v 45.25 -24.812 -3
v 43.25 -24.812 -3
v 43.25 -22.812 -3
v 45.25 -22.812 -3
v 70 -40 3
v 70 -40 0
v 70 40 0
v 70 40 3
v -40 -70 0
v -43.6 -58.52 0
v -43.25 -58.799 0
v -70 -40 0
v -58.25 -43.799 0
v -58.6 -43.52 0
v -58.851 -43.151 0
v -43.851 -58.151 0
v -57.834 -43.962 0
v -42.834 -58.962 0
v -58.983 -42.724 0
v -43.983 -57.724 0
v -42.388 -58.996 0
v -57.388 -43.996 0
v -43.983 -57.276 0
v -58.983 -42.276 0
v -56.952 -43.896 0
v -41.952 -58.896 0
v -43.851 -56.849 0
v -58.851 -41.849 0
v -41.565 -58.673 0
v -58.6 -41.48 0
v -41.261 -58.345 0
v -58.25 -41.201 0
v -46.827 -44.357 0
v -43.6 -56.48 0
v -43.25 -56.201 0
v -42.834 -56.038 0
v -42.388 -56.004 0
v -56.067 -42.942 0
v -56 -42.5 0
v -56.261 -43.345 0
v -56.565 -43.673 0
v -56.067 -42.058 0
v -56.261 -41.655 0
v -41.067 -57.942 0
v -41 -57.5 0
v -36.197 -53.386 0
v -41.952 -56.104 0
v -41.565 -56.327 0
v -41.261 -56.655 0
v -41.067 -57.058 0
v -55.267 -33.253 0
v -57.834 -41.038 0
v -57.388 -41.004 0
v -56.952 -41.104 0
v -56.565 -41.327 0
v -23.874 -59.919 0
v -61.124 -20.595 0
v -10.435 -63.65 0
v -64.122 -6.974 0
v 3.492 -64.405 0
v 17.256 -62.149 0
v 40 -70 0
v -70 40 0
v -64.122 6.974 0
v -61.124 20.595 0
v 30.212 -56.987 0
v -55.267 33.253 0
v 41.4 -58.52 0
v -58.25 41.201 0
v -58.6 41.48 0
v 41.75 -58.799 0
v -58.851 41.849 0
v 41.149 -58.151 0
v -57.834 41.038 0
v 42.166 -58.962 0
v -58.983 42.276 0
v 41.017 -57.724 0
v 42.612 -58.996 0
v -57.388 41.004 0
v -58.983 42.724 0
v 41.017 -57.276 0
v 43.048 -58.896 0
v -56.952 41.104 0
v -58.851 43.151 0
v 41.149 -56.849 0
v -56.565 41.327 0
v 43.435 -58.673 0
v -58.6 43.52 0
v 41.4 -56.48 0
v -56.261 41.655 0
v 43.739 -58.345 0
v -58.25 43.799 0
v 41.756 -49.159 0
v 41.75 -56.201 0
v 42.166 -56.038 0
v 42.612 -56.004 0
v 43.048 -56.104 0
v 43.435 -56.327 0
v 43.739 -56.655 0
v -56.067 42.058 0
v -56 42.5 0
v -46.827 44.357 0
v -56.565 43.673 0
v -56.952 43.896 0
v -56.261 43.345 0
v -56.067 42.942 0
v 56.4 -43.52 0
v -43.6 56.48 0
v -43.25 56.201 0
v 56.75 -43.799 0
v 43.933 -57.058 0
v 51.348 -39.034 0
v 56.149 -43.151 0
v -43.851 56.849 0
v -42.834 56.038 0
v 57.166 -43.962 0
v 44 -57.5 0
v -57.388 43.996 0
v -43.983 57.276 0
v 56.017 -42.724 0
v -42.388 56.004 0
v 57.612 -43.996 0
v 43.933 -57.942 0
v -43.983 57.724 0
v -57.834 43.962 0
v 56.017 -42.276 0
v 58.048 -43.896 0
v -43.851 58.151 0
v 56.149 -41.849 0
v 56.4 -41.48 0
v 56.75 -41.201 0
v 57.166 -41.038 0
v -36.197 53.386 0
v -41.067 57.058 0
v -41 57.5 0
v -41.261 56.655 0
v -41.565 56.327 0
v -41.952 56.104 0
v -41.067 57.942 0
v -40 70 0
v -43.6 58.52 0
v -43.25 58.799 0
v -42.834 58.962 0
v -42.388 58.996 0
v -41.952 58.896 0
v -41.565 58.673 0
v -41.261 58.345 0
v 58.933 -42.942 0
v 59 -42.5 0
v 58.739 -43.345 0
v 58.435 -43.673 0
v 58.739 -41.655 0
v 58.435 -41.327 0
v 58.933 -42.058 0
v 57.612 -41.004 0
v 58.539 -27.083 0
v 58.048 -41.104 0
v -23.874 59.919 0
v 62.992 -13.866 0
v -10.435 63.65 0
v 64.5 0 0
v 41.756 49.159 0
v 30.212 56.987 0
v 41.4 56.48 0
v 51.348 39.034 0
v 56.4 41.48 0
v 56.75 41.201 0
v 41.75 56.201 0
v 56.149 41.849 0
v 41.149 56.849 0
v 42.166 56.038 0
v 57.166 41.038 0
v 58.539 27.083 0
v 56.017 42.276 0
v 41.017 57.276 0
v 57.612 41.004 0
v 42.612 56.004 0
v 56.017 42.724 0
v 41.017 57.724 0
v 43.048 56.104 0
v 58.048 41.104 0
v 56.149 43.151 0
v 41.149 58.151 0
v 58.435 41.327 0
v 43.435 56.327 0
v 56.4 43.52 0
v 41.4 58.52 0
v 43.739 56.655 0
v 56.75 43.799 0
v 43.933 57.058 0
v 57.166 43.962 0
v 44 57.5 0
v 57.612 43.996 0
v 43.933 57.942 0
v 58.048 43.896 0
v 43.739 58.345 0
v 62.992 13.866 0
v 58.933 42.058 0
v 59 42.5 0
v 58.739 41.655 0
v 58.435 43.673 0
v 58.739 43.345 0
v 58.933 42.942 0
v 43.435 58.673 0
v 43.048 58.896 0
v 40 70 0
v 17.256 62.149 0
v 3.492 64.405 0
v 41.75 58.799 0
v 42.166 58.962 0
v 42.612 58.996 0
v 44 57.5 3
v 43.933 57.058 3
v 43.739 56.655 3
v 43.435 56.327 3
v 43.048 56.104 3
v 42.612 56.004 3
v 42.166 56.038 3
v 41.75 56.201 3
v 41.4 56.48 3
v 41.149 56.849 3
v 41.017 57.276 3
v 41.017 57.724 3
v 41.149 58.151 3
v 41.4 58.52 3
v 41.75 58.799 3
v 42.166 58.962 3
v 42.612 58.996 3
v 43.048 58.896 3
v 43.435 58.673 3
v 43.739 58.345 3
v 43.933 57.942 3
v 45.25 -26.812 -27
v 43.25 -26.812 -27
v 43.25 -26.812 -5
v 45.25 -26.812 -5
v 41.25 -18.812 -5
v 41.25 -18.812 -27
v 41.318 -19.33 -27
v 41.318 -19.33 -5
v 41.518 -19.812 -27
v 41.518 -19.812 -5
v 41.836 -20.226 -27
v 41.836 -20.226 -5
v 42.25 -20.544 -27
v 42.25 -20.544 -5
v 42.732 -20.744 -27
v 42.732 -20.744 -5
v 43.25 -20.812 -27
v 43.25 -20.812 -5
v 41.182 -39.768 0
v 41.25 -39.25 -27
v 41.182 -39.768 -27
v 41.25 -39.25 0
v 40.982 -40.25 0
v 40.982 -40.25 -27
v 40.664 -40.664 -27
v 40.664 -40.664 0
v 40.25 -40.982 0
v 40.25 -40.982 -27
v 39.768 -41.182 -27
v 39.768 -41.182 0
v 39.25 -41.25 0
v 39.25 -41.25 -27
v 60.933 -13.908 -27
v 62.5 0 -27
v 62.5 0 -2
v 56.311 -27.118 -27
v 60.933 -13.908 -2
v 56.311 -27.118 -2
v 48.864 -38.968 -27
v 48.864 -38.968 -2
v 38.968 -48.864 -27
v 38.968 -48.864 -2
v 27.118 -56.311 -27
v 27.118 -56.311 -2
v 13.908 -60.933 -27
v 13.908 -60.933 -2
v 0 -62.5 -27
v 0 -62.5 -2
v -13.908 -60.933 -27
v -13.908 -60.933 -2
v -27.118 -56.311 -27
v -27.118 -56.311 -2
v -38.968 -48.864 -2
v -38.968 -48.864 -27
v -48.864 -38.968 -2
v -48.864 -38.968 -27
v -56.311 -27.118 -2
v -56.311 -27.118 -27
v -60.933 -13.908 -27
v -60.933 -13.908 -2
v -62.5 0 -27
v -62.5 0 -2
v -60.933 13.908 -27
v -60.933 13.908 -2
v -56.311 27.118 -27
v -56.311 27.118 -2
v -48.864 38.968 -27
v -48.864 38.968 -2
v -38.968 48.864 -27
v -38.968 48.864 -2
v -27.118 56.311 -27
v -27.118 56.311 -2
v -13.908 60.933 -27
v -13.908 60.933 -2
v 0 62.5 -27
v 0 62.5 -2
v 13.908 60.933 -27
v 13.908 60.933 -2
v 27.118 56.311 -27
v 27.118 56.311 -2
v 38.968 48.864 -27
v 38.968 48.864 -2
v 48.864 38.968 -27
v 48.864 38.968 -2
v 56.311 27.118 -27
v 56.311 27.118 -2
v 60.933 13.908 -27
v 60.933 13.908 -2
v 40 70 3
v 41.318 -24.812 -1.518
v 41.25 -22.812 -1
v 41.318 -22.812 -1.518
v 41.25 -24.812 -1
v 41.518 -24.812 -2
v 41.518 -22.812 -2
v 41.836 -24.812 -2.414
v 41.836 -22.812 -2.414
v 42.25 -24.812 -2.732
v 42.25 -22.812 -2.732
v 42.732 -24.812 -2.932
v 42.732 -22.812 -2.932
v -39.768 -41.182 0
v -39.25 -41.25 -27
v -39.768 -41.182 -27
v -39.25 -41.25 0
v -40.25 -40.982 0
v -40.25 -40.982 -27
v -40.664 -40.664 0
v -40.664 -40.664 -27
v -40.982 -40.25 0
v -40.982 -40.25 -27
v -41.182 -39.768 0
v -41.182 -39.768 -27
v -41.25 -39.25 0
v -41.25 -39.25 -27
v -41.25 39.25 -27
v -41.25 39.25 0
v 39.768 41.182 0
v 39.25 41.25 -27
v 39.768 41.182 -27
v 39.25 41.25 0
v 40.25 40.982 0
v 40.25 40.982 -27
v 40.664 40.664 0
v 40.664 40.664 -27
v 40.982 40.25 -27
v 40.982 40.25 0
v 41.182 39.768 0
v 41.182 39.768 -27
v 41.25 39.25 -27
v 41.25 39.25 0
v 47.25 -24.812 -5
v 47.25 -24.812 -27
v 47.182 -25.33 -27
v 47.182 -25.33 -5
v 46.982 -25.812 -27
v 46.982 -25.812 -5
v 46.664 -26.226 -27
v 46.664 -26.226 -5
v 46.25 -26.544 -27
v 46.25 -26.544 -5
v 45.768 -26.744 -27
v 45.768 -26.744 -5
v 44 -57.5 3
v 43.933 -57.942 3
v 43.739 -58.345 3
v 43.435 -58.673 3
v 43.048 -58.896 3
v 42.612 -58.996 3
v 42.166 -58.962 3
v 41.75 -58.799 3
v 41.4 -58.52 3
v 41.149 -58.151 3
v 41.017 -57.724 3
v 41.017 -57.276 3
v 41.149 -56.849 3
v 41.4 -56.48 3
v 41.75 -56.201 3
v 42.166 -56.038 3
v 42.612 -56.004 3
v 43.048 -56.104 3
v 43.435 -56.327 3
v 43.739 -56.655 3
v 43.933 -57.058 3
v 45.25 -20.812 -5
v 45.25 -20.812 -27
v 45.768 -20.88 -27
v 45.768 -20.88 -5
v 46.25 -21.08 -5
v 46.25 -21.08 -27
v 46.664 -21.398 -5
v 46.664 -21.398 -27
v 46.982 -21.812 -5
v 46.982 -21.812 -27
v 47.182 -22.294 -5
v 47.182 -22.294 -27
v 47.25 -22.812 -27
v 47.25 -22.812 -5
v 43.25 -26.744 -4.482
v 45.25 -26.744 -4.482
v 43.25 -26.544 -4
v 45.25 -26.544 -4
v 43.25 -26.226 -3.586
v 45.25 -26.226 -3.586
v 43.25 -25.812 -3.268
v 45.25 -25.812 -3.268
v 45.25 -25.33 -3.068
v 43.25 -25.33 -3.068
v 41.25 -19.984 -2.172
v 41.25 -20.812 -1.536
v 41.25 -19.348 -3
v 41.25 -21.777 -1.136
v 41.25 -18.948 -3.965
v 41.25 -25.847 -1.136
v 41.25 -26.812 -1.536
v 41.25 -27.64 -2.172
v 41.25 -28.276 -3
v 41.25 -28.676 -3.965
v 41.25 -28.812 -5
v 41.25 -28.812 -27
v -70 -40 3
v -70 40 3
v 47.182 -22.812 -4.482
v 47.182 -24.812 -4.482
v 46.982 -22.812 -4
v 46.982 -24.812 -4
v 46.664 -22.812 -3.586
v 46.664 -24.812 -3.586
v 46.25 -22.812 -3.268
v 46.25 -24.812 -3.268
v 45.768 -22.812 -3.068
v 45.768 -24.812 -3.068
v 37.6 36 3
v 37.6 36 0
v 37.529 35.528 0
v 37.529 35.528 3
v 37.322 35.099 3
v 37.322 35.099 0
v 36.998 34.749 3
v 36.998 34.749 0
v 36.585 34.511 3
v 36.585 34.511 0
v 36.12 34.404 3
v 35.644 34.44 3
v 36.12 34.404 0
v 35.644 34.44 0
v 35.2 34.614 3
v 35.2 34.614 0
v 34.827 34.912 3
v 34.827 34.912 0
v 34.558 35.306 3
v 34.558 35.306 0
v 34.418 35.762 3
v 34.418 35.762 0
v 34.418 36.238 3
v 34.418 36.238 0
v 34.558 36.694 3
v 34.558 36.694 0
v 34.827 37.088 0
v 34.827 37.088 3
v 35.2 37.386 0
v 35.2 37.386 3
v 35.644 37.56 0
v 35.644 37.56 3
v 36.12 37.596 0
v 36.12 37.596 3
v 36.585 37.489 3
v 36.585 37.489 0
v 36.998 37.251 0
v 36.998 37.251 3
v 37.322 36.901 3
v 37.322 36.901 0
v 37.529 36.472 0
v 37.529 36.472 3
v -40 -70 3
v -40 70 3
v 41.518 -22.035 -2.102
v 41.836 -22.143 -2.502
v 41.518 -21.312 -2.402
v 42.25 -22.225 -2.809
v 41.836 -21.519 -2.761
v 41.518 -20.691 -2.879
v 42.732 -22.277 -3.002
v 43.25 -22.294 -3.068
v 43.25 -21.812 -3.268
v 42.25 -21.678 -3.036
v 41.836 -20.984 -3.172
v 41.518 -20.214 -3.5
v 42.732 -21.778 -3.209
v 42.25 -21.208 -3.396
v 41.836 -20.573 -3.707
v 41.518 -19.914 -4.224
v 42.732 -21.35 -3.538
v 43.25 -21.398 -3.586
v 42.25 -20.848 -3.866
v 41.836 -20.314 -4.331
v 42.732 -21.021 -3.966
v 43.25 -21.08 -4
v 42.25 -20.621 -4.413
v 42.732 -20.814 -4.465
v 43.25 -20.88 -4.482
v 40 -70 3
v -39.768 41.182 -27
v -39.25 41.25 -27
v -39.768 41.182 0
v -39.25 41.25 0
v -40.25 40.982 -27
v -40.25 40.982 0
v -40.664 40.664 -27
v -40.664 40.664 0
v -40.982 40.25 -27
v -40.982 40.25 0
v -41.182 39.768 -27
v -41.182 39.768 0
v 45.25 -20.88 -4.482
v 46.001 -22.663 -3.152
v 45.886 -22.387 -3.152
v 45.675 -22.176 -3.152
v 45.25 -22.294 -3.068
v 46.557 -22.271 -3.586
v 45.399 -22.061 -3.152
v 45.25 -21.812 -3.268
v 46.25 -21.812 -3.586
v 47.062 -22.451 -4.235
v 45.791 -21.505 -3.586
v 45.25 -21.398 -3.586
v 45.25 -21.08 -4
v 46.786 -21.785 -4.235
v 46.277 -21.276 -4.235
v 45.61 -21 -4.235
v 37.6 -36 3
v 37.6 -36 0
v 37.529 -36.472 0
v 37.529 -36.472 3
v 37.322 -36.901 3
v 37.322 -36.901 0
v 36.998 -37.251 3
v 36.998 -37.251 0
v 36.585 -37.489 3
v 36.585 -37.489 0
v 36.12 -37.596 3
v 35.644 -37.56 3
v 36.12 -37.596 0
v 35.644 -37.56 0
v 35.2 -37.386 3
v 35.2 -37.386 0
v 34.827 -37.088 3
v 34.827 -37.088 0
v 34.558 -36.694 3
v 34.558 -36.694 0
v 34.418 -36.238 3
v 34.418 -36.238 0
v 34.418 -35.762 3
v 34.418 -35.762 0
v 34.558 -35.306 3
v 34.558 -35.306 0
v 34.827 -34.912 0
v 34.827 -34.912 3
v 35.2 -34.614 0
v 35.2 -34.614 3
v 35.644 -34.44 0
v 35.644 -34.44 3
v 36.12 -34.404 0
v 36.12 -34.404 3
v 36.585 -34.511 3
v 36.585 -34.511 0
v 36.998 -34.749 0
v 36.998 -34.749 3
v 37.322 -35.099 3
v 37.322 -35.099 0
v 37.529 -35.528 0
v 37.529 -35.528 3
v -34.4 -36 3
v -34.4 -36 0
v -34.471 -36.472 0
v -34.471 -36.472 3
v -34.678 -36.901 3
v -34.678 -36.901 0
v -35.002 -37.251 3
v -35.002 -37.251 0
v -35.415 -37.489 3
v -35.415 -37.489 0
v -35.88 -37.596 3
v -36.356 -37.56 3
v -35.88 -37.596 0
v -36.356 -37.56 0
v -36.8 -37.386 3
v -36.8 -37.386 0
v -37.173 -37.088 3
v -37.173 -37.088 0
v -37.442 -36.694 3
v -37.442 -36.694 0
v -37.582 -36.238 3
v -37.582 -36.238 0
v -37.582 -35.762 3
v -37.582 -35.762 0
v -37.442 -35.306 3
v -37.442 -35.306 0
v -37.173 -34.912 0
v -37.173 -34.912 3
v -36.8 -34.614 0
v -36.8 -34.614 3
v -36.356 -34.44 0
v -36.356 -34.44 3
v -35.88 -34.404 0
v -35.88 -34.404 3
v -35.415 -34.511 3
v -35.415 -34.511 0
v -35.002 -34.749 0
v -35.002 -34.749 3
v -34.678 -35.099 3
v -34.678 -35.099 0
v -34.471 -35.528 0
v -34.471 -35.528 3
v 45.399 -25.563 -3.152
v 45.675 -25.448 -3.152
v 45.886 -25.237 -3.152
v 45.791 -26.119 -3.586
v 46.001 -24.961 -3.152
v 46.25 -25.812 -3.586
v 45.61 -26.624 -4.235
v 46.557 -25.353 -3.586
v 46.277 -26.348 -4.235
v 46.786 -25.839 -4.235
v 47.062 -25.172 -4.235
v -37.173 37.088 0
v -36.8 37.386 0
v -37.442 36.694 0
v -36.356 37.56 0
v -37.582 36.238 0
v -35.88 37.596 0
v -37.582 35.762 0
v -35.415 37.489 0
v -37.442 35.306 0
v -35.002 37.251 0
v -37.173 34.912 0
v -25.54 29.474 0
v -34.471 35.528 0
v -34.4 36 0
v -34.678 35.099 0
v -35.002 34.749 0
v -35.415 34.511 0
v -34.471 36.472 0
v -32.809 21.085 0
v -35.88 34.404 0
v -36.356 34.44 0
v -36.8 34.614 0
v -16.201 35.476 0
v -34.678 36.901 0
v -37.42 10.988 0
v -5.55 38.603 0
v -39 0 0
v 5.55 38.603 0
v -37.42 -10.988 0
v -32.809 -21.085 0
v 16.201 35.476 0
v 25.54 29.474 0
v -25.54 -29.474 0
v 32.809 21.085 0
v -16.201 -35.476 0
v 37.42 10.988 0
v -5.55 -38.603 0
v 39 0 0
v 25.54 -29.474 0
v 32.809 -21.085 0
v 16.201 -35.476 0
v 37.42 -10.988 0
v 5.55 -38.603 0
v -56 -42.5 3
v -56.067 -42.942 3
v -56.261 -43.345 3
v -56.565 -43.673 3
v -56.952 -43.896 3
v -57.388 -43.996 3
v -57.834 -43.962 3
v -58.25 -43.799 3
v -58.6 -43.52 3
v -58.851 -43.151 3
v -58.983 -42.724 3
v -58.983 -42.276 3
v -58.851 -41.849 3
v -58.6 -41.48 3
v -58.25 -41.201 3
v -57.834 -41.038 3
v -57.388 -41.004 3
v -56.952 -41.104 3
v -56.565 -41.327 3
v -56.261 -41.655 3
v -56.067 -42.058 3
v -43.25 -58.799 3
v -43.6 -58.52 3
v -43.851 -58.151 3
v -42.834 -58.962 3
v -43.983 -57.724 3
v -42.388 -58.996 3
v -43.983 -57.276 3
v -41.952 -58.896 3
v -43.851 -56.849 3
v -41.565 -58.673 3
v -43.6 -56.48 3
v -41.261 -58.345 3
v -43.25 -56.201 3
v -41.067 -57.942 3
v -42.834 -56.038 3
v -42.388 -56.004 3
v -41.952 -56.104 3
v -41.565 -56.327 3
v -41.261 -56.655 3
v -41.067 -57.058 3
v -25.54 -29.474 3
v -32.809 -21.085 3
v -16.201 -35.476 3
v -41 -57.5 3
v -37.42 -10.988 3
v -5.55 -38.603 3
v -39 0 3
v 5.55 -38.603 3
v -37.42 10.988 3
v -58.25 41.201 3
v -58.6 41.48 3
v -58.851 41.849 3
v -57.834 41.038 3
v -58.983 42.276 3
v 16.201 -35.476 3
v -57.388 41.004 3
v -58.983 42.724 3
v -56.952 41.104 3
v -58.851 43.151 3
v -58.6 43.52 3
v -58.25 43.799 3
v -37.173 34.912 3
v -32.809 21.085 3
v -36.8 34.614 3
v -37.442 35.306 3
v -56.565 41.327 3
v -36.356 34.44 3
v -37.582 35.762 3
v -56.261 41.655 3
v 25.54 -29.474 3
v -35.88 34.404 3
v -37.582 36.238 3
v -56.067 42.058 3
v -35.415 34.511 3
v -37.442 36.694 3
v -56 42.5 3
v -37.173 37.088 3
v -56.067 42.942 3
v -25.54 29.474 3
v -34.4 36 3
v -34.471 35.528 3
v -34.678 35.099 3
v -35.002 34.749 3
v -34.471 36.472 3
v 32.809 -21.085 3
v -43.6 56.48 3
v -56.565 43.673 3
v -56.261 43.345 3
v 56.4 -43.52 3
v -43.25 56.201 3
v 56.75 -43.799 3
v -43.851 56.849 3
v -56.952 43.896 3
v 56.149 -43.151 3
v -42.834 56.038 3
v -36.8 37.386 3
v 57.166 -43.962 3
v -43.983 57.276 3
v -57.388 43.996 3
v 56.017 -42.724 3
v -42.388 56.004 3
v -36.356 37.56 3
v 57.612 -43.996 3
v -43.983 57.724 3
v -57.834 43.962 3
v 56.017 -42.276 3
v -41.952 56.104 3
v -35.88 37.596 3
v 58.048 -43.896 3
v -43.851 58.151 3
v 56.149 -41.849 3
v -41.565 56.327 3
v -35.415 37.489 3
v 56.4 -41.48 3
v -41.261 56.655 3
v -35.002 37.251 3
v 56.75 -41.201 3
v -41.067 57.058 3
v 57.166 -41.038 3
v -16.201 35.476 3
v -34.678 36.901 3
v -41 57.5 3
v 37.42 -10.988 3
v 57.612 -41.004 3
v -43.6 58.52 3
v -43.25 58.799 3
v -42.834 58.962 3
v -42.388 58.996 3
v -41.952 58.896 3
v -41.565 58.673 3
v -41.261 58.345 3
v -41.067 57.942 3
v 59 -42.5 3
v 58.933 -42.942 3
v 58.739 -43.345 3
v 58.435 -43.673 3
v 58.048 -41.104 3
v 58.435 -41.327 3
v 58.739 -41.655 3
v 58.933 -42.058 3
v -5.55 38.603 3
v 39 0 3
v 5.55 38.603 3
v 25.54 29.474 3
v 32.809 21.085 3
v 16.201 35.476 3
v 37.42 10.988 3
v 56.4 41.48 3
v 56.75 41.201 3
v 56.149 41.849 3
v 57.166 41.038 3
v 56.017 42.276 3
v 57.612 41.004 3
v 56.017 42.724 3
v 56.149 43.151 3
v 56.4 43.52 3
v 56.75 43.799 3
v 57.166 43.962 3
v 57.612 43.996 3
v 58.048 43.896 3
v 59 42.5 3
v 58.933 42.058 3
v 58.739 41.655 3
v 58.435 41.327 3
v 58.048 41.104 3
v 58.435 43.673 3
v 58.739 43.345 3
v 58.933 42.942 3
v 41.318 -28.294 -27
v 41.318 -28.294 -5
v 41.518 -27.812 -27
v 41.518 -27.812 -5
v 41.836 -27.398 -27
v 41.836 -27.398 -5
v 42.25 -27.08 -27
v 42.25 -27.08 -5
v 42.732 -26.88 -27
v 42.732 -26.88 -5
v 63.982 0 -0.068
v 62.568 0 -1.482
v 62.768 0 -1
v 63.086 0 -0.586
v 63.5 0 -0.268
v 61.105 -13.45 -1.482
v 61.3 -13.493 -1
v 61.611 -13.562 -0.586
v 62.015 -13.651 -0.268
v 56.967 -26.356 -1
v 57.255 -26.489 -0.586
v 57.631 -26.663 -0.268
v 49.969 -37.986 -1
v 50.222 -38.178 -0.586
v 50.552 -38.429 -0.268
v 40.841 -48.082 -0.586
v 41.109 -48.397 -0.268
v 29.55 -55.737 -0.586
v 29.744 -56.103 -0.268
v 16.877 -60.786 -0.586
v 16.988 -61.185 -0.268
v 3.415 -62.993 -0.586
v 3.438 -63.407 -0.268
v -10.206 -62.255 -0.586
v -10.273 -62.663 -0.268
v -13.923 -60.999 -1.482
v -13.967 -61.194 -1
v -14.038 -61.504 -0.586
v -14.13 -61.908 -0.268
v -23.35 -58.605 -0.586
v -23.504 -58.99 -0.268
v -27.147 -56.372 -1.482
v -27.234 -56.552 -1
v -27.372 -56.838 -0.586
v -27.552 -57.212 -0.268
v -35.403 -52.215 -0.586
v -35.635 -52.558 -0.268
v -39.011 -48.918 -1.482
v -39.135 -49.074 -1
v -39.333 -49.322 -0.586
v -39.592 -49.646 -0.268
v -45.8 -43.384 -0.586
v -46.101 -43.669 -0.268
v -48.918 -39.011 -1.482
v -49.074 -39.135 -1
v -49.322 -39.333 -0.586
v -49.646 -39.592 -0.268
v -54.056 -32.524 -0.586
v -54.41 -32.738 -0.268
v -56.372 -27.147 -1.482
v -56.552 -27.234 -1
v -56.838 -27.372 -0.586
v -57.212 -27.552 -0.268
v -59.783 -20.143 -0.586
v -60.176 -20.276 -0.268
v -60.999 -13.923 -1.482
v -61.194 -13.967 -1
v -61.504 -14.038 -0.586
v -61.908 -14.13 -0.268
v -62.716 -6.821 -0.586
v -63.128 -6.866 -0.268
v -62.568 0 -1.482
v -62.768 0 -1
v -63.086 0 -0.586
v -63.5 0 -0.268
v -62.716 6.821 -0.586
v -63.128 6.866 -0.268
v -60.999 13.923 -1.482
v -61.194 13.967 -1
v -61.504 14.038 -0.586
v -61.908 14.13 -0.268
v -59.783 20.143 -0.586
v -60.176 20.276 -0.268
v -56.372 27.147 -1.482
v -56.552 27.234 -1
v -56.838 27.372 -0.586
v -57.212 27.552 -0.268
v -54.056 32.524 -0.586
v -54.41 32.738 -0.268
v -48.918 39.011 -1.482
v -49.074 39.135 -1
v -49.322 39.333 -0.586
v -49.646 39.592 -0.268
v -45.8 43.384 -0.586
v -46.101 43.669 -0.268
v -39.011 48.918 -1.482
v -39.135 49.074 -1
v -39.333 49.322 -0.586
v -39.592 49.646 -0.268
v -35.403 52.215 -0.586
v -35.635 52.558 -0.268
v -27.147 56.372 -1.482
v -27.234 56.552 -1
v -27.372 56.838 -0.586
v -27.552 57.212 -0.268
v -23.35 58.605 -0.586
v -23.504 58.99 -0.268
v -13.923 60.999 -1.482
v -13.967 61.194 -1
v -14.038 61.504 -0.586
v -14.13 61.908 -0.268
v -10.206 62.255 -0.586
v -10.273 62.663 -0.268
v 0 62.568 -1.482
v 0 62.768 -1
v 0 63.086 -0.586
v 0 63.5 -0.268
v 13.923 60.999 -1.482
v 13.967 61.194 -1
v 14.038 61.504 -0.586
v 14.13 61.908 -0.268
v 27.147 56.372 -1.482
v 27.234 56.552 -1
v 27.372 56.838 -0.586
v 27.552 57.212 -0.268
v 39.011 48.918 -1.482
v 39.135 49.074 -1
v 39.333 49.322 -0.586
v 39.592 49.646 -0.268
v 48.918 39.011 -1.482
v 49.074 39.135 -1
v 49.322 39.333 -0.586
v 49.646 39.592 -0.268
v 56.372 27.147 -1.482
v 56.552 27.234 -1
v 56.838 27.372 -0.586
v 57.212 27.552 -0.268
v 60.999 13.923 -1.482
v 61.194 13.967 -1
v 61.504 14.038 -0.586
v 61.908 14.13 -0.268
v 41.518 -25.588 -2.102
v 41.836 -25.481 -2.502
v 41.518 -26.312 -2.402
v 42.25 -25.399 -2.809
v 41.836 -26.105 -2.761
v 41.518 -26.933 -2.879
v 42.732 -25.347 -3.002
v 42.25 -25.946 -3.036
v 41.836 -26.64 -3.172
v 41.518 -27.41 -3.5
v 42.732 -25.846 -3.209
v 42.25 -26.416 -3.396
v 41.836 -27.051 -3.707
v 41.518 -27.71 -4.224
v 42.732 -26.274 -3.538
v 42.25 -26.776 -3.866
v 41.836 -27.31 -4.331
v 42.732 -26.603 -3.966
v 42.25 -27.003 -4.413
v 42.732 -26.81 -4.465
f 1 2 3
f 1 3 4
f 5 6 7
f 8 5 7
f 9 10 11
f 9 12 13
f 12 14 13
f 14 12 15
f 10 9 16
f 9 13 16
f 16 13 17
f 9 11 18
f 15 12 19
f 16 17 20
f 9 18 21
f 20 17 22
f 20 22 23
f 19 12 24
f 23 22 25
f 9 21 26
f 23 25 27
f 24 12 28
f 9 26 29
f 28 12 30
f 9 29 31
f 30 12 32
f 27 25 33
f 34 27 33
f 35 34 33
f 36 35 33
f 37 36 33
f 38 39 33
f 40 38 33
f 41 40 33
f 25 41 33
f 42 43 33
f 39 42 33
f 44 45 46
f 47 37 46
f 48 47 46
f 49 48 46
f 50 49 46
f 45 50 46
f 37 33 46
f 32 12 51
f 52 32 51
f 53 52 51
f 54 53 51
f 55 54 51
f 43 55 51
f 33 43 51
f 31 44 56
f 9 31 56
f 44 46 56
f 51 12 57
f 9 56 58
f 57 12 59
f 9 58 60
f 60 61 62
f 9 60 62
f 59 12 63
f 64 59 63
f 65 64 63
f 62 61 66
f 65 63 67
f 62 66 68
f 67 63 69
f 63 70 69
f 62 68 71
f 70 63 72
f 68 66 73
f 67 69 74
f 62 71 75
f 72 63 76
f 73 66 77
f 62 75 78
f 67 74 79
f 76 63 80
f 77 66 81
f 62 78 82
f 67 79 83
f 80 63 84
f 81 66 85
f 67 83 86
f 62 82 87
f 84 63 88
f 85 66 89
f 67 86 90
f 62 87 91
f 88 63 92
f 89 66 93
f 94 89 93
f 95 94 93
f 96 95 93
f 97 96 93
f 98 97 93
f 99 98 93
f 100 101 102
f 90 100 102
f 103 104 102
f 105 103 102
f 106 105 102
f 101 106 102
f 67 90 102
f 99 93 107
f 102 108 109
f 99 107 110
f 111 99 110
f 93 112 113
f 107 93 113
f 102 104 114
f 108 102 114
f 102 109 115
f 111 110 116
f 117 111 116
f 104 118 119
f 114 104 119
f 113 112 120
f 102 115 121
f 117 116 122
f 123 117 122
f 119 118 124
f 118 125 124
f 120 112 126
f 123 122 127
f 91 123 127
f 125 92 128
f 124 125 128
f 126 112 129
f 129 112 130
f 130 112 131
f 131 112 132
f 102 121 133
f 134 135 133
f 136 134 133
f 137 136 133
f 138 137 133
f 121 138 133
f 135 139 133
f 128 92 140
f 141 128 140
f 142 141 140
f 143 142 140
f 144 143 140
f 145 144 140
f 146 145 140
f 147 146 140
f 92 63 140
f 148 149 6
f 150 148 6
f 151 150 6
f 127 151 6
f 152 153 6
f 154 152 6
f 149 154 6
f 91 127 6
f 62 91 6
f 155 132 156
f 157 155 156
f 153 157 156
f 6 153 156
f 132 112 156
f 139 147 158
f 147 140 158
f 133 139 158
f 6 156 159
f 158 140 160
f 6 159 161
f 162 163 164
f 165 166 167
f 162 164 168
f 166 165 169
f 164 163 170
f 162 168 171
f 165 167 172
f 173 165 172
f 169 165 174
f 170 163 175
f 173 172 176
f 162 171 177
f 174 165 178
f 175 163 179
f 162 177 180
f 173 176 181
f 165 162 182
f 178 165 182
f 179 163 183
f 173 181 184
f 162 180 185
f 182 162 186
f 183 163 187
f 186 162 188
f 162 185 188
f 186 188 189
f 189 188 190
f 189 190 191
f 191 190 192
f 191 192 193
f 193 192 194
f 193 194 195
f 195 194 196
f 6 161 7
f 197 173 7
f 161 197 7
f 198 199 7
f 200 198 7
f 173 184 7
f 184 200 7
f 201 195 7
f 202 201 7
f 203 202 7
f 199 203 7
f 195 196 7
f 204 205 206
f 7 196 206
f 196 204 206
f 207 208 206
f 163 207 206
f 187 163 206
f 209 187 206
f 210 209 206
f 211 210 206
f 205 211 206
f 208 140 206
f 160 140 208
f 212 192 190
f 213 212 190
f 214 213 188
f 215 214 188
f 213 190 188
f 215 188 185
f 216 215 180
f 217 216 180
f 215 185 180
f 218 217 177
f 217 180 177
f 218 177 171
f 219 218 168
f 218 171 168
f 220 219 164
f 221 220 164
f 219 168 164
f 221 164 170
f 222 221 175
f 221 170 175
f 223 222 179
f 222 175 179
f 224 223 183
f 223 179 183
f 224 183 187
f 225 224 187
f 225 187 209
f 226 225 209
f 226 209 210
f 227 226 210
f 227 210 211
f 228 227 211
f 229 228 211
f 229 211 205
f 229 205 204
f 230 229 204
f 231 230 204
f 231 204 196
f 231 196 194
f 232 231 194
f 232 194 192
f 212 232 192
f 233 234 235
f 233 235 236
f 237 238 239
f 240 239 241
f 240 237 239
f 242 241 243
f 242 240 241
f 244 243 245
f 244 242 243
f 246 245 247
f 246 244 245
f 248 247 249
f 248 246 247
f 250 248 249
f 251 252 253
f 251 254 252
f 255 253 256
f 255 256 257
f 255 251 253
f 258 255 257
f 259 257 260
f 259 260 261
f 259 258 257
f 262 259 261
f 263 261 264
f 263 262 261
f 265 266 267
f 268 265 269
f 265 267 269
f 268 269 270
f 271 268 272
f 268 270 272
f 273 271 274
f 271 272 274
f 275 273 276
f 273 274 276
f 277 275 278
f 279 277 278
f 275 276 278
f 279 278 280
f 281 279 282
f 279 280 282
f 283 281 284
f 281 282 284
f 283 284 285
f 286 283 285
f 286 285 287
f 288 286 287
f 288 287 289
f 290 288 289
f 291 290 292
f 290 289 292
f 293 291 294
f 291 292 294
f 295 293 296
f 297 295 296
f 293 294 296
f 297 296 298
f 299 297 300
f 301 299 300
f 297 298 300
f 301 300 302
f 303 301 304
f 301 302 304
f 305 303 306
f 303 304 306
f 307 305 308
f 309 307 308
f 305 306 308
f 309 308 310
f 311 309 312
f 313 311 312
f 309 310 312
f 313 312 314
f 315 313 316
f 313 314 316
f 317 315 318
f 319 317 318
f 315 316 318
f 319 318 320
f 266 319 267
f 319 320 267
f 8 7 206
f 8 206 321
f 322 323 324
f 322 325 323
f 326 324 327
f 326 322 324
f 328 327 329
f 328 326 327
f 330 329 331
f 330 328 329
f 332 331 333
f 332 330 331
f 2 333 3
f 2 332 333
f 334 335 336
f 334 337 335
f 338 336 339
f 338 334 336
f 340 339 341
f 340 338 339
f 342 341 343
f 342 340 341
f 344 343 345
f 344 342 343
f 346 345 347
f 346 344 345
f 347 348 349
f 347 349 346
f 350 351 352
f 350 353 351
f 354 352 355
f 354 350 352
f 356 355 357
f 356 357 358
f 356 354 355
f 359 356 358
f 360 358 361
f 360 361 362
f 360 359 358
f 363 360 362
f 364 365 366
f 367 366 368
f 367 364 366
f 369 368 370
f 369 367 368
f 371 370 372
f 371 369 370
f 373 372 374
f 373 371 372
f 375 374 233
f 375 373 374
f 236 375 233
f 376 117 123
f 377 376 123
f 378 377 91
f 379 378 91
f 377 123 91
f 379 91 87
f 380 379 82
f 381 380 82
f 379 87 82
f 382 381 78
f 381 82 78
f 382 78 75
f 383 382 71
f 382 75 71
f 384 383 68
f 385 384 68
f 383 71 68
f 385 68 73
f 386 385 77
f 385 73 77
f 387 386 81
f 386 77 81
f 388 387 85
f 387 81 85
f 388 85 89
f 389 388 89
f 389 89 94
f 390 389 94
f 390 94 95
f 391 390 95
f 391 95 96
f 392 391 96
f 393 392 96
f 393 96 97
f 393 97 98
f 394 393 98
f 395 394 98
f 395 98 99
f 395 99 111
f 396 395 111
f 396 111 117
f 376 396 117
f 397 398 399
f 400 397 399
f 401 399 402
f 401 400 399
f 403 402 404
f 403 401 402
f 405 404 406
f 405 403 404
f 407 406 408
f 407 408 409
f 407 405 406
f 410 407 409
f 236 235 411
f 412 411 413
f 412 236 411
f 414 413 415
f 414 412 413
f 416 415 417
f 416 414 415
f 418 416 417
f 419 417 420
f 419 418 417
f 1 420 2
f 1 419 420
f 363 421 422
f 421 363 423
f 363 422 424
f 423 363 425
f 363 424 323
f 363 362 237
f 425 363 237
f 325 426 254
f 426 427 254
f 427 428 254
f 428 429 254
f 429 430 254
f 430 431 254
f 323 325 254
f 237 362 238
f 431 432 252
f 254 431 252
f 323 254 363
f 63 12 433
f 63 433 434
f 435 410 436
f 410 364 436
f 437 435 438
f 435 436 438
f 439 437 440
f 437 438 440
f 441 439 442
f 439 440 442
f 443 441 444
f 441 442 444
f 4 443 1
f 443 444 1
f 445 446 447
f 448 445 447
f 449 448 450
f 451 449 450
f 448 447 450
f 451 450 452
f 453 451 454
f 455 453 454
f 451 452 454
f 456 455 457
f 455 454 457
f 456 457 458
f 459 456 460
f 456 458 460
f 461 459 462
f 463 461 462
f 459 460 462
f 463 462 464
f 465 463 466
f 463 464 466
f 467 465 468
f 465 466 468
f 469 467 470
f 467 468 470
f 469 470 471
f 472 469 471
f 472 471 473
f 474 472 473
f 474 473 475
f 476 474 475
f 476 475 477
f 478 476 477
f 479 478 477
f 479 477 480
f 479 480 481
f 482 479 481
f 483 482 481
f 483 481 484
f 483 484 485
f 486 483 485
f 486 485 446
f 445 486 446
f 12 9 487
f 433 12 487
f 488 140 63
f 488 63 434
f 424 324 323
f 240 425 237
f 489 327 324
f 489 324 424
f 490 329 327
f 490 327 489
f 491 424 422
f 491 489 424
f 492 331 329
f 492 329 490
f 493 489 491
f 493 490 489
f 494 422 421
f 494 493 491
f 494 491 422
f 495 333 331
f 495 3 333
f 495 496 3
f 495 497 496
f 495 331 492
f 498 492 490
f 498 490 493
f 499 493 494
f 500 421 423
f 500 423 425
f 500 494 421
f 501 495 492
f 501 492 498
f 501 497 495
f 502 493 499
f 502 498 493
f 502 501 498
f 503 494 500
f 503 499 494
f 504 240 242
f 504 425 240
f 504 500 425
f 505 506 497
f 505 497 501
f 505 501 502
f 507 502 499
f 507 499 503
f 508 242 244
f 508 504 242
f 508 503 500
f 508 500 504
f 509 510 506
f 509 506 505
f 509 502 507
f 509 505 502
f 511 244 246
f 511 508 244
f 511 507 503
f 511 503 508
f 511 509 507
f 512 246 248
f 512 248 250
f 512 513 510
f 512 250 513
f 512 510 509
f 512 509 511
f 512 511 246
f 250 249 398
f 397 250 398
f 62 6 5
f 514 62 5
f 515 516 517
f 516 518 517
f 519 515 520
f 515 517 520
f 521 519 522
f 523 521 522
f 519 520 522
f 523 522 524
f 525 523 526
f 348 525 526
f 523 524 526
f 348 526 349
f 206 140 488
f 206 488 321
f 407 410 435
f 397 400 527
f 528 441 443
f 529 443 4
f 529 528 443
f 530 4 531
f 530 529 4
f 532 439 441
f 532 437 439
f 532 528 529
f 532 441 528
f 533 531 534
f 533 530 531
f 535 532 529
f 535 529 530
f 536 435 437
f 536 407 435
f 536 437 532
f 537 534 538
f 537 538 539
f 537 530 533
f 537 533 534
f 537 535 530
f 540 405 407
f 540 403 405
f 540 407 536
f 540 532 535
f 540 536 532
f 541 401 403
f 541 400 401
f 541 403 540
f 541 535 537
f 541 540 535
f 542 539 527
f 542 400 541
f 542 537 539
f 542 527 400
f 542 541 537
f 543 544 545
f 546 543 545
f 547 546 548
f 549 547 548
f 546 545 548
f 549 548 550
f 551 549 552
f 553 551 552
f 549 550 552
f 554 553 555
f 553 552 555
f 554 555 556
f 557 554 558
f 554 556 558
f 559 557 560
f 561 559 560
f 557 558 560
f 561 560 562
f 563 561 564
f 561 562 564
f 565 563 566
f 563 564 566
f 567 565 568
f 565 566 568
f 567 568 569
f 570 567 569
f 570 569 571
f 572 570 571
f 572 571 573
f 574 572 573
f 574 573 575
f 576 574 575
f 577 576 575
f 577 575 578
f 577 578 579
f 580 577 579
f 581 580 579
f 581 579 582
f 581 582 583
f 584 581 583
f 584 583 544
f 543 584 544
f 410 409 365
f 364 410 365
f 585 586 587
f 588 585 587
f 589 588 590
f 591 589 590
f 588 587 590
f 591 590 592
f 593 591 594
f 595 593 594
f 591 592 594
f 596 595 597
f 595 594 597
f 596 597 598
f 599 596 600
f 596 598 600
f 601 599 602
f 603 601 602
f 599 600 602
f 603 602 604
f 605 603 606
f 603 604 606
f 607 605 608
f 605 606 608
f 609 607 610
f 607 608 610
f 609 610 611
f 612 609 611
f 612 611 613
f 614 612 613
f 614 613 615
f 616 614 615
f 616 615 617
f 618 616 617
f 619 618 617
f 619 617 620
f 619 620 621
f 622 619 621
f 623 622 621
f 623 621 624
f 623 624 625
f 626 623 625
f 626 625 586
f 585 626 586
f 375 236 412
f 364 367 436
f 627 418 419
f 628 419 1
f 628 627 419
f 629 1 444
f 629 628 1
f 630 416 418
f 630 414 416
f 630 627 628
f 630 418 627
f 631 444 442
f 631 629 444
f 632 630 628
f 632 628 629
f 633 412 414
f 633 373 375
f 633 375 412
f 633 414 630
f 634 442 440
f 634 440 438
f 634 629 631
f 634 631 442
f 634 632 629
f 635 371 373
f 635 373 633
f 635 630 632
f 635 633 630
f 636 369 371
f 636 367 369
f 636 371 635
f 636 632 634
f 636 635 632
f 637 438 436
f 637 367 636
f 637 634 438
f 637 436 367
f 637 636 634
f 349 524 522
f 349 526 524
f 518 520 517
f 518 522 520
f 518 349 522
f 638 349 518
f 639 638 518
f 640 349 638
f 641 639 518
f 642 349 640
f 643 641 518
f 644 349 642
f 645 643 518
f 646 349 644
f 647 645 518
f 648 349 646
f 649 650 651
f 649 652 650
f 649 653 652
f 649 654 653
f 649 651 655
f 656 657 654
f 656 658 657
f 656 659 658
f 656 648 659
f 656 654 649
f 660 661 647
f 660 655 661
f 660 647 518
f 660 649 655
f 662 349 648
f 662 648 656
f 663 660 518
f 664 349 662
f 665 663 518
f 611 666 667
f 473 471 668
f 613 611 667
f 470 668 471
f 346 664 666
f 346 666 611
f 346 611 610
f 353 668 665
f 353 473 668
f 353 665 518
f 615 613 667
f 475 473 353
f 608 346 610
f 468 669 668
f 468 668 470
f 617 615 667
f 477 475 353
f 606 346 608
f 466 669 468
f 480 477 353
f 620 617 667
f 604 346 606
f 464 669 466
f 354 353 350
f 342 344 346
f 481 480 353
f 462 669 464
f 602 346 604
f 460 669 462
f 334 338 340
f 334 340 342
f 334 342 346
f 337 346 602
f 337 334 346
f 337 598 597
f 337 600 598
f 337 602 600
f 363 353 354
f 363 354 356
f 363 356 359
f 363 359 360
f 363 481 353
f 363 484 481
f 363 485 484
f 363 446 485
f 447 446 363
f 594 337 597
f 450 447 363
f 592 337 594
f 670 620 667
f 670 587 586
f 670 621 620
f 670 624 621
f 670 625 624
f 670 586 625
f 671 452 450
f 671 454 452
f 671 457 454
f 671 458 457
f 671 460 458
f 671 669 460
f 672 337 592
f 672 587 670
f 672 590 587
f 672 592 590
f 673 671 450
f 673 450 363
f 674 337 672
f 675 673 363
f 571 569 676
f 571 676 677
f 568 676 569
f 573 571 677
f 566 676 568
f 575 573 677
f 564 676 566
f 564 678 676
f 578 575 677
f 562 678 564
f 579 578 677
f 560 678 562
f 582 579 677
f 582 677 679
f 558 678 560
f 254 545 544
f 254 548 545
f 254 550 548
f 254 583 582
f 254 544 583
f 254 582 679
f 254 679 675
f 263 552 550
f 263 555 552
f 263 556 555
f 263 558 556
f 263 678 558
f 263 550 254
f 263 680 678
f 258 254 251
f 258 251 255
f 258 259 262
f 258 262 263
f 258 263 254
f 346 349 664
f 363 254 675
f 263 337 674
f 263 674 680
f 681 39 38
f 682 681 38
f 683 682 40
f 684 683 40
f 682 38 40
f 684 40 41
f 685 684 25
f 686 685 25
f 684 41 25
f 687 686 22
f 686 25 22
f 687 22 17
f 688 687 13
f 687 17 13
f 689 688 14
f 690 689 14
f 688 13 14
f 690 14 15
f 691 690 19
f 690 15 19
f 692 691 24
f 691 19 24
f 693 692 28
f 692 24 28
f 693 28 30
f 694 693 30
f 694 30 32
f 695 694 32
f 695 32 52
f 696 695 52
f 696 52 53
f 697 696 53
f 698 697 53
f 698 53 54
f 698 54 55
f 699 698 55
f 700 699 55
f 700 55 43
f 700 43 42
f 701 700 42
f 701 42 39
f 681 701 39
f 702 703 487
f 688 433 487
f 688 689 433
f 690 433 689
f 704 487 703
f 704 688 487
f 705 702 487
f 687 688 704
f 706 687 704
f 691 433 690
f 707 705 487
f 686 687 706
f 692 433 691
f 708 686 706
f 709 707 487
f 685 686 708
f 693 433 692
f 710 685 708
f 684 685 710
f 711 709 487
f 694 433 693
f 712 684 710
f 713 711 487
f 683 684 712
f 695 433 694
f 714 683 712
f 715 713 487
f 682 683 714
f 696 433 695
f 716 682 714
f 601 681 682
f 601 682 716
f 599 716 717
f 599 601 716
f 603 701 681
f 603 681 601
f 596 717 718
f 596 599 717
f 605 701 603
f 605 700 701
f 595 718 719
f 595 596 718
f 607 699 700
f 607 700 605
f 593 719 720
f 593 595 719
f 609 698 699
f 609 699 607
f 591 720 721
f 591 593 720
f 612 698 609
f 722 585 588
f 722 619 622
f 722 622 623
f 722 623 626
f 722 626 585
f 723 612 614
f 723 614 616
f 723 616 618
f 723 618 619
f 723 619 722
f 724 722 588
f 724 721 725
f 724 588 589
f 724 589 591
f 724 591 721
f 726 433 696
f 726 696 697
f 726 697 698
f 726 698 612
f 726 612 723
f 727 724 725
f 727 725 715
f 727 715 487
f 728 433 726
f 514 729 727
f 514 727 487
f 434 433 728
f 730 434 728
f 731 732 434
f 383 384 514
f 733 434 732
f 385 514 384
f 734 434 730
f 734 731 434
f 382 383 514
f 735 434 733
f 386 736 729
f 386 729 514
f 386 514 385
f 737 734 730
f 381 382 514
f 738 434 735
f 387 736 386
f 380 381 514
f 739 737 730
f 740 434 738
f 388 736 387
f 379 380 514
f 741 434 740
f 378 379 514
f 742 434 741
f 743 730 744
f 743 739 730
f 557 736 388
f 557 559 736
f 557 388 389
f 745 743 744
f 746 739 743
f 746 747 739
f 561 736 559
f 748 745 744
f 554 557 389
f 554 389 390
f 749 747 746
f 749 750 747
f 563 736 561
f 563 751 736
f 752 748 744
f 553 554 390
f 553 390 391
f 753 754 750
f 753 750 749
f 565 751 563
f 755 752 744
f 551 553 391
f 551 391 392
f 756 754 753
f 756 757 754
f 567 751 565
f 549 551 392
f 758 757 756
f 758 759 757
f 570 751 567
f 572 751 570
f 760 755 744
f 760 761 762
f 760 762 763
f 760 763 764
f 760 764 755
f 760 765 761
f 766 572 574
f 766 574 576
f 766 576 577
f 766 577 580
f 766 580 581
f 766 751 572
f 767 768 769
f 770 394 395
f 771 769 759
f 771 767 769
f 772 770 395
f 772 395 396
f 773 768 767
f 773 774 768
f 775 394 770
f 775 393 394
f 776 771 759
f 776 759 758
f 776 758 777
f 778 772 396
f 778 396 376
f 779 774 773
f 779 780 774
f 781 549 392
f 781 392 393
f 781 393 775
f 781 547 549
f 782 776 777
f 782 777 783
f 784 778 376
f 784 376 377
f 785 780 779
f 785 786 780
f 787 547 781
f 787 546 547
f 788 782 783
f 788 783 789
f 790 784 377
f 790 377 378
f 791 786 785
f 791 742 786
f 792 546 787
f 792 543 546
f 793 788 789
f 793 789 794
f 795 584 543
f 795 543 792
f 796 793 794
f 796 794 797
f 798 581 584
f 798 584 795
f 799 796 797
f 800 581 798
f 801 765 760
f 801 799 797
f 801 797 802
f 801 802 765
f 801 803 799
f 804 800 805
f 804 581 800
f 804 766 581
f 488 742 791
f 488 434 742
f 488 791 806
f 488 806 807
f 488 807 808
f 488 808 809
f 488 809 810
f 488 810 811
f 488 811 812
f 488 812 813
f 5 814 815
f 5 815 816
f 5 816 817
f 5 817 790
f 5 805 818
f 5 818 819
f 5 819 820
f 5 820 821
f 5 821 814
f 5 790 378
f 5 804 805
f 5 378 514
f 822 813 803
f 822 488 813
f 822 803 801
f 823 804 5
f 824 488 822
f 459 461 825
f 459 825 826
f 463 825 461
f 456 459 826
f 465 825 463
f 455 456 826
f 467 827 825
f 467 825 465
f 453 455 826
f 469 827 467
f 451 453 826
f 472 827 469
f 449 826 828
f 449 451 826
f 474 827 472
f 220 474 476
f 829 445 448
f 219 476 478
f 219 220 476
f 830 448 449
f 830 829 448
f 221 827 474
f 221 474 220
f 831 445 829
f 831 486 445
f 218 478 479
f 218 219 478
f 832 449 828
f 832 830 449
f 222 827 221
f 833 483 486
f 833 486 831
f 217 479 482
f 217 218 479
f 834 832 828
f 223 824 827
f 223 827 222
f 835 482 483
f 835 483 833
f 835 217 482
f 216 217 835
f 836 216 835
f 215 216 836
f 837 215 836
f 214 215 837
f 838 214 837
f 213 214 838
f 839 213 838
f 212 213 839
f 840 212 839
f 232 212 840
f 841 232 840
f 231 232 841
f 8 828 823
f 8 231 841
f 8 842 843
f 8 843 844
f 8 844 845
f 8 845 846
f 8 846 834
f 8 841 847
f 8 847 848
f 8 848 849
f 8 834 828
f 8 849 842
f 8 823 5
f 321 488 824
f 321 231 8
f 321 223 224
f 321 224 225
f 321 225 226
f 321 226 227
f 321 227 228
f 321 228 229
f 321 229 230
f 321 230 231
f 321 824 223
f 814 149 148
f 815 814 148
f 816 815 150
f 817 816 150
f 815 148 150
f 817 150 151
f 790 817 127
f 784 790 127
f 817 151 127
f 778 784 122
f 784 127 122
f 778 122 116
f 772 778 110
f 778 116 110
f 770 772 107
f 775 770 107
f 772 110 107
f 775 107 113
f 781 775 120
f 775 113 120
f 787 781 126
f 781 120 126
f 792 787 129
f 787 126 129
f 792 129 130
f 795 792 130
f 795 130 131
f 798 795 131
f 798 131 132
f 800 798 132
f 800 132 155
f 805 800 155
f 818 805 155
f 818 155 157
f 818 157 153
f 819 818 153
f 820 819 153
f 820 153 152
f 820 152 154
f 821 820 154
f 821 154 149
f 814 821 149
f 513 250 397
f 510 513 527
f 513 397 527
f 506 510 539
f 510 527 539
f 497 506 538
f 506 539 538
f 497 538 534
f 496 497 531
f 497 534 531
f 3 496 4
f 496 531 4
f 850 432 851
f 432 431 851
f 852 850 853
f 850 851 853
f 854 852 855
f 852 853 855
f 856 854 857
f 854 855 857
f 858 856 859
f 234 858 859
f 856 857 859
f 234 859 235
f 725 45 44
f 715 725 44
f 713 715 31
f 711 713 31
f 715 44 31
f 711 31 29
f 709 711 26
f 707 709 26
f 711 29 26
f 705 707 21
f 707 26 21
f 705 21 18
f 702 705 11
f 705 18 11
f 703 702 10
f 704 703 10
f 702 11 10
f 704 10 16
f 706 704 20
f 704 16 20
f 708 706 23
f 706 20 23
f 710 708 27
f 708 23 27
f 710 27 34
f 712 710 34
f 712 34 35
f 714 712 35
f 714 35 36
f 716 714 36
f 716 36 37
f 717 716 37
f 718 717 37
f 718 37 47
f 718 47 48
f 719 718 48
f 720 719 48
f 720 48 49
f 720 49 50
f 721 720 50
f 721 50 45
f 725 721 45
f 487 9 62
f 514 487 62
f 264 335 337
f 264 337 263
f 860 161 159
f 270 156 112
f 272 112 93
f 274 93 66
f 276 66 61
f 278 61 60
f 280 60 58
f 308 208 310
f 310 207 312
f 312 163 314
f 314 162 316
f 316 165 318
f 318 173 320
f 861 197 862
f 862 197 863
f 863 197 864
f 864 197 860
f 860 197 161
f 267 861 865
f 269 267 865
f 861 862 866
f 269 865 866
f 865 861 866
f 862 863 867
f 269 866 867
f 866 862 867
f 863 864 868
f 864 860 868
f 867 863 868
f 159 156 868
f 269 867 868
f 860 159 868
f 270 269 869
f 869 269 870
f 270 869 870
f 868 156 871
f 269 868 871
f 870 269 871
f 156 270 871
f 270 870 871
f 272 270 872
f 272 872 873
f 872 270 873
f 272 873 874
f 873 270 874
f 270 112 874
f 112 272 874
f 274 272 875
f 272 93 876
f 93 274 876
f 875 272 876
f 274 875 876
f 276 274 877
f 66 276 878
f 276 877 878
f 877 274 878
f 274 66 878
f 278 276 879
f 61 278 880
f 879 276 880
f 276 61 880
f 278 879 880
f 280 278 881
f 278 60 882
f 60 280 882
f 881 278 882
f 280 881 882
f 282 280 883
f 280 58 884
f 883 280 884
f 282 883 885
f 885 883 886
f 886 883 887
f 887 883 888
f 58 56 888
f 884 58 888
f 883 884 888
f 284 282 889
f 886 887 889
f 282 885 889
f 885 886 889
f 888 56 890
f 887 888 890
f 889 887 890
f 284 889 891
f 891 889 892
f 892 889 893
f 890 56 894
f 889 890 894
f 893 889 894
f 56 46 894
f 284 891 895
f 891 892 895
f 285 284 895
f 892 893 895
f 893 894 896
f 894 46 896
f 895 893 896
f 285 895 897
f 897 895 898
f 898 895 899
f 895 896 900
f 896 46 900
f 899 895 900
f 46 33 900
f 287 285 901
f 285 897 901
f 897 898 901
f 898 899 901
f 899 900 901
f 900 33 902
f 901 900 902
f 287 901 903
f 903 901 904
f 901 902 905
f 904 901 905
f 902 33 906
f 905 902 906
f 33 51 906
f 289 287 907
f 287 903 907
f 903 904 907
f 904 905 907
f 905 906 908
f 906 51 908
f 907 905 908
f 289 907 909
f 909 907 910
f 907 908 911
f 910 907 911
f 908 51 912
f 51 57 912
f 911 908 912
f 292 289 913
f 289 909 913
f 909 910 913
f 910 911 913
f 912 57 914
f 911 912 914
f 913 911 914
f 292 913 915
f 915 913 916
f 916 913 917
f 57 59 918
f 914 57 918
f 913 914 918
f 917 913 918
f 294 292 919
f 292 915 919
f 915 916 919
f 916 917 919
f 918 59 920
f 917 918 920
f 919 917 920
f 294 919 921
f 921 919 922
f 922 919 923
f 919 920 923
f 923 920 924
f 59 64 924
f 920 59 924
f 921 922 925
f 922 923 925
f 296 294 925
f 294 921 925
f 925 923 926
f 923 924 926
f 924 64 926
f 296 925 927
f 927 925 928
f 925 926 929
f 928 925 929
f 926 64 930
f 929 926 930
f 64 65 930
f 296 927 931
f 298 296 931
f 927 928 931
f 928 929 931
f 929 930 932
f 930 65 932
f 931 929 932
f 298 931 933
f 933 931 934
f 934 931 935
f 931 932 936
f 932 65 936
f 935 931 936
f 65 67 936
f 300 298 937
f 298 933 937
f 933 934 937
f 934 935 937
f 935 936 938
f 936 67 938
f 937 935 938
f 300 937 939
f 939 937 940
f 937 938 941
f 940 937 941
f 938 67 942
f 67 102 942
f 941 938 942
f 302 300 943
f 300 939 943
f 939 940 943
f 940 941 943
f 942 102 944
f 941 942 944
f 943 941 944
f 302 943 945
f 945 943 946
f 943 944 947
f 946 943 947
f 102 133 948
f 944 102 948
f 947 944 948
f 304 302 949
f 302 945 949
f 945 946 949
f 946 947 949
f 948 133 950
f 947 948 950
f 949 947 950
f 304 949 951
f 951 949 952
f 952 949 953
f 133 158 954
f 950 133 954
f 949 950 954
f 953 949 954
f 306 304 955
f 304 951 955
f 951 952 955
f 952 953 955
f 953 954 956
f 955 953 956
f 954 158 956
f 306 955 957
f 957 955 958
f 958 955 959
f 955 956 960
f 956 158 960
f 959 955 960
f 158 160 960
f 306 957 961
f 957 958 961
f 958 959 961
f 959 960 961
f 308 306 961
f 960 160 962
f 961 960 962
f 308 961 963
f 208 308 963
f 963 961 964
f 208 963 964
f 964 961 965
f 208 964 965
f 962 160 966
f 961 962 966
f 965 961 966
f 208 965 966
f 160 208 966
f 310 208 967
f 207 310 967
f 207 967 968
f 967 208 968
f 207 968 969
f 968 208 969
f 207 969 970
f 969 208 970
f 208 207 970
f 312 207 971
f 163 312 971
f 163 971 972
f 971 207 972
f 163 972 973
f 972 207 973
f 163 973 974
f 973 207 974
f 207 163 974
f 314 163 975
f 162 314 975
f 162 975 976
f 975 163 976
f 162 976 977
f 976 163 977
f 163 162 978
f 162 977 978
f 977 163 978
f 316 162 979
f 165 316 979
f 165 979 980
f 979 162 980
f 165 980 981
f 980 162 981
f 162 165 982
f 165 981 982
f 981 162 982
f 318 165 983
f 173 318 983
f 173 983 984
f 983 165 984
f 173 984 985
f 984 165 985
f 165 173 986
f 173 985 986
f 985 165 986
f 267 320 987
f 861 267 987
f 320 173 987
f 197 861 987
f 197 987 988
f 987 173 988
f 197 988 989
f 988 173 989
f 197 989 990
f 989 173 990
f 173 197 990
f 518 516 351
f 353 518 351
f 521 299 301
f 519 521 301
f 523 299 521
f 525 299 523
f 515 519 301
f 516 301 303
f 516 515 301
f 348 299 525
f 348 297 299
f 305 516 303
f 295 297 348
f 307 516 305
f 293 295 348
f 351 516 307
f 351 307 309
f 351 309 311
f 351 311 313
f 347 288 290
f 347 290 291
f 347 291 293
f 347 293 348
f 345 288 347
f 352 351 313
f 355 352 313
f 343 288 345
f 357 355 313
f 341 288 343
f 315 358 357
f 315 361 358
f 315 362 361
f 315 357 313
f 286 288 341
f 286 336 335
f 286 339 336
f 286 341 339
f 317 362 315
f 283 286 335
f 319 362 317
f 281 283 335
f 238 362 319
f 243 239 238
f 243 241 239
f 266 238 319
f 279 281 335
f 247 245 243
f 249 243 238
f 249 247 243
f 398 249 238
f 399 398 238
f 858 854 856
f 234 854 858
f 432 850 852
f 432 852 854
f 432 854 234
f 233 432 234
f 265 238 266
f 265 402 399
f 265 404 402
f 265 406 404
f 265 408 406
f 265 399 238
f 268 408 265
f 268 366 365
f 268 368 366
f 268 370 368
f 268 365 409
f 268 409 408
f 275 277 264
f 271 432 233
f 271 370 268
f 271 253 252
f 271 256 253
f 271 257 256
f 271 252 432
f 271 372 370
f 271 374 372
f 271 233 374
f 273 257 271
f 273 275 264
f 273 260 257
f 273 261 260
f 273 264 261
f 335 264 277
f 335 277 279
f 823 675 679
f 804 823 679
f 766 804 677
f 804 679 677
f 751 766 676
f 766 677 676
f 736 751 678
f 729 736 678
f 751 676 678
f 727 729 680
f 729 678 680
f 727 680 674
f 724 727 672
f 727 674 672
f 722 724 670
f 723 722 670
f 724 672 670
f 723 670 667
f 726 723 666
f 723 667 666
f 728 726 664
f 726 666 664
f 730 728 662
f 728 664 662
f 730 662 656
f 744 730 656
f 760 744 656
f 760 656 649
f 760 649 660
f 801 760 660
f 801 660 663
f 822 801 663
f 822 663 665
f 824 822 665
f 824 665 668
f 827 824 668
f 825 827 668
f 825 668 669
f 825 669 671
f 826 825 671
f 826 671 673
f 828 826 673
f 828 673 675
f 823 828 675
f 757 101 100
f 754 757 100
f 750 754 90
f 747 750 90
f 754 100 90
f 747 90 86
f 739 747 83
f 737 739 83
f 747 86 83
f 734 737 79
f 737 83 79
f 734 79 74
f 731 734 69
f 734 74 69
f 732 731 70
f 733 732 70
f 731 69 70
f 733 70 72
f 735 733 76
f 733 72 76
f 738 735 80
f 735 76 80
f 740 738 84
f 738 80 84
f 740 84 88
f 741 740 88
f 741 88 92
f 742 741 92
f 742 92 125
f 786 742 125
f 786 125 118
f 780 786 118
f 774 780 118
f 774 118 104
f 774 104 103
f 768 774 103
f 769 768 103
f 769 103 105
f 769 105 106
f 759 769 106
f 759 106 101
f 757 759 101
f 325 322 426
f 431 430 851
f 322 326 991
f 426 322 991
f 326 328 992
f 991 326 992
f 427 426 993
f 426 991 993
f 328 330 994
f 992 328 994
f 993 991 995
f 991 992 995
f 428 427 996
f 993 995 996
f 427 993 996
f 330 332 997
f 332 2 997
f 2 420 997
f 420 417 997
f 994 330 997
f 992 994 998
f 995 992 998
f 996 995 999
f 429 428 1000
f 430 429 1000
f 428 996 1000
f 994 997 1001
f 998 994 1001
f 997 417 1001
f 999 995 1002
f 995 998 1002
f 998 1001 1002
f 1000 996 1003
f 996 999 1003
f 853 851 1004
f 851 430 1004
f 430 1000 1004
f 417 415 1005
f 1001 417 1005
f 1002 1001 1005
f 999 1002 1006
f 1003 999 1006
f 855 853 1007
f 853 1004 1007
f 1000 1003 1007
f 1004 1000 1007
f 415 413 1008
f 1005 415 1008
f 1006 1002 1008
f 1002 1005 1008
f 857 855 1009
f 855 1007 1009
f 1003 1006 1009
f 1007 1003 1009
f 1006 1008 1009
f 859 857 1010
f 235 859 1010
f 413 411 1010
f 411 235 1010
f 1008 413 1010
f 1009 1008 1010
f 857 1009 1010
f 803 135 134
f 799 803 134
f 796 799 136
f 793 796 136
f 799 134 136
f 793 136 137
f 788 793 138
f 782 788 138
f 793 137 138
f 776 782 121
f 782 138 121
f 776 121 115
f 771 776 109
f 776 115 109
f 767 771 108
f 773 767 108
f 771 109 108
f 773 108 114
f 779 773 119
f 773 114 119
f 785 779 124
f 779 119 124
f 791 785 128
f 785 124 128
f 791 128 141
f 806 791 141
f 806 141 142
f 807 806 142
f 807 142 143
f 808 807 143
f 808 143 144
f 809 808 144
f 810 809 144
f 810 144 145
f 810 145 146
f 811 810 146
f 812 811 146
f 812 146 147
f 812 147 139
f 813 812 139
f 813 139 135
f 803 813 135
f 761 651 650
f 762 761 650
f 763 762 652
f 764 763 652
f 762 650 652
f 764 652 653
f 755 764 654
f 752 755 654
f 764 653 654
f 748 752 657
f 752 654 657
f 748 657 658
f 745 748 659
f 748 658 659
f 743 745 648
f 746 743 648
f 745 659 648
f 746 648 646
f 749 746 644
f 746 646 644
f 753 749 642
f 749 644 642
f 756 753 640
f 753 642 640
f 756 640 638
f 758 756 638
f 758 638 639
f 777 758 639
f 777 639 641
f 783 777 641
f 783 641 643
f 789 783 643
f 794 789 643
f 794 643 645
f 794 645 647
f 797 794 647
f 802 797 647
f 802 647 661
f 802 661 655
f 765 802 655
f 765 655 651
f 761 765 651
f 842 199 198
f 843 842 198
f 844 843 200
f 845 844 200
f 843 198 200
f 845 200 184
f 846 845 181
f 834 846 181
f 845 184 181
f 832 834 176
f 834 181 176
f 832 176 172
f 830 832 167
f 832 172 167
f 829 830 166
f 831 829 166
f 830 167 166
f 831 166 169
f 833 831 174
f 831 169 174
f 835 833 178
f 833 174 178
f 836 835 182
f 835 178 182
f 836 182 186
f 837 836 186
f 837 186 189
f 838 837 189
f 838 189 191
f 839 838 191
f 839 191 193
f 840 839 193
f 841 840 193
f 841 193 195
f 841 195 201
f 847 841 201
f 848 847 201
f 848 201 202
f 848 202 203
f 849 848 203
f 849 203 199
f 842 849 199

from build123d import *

# Parameters (mm, degrees)
SKETCH_W        = 140
SKETCH_H        = 140
PAD_DEPTH       = 3
SKETCH001_R     = 62.5
PAD001_DEPTH    = 27
SKETCH002_W     = 82.5
SKETCH002_H     = 82.5
POCKET_DEPTH    = 27
SKETCH003_R     = 1.6
SKETCH003_R_2   = 39
POCKET001_DEPTH = 5
FILLET_R        = 2
CHAMFER_SIZE    = 30
SKETCH004_R     = 1.5
HOLE_DEPTH      = 25
SKETCH005_W     = 6
SKETCH005_H     = 6
POCKET002_DEPTH = 24
FILLET001_R     = 2
FILLET002_R     = 2


with BuildPart() as part:
    # Sketch → Pad (new body)
    with BuildSketch(Plane.XY):
        Rectangle(SKETCH_W, SKETCH_H)
    extrude(amount=PAD_DEPTH)

    # Sketch001 (on Face5 of Pad) → Pad001 (join)
    with BuildSketch(Plane(origin=(0, 0, 0), x_dir=(1, 0, 0), z_dir=(0, 0, -1))):
        Circle(SKETCH001_R)
    extrude(amount=PAD001_DEPTH)

    # Sketch002 (on Face8 of Pad001) → Pocket (cut)
    with BuildSketch(Plane(origin=(0, 0, -27), x_dir=(1, 0, 0), z_dir=(0, 0, -1))):
        Rectangle(SKETCH002_W, SKETCH002_H)
    extrude(amount=-POCKET_DEPTH, mode=Mode.SUBTRACT)

    # Sketch003 (on Face13 of Pocket) → Pocket001 (cut)
    with BuildSketch(Plane(origin=(0, 0, 0), x_dir=(1, 0, 0), z_dir=(0, 0, -1))):
        with Locations((-36, 36)):
            Circle(SKETCH003_R)
        with Locations((36, 36)):
            Circle(SKETCH003_R)
        with Locations((-36, -36)):
            Circle(SKETCH003_R)
        with Locations((36, -36)):
            Circle(SKETCH003_R)
        Circle(SKETCH003_R_2)
    extrude(amount=-POCKET001_DEPTH, mode=Mode.SUBTRACT)

    # Fillet
    fillet_edges = [part.edges().sort_by_distance(p)[0] for p in [
        (41.25, 41.25, -13.5),
        (-41.25, 41.25, -13.5),
        (-41.25, -41.25, -13.5),
        (41.25, -41.25, -13.5),
    ]]
    fillet(fillet_edges, radius=FILLET_R)

    # Chamfer
    chamfer_edges = [part.edges().sort_by_distance(p)[0] for p in [
        (70, 70, 1.5),
        (-70, 70, 1.5),
        (70, -70, 1.5),
        (-70, -70, 1.5),
    ]]
    chamfer(chamfer_edges, length=CHAMFER_SIZE)

    # Sketch004 (on Face1 of Chamfer) → Hole (cut)
    with BuildSketch(Plane(origin=(0, 0, 0), x_dir=(1, 0, 0), z_dir=(0, 0, -1))):
        with Locations((-42.5, 57.5)):
            Circle(SKETCH004_R)
        with Locations((-57.5, 42.5)):
            Circle(SKETCH004_R)
        with Locations((42.5, 57.5)):
            Circle(SKETCH004_R)
        with Locations((57.5, 42.5)):
            Circle(SKETCH004_R)
        with Locations((57.5, -42.5)):
            Circle(SKETCH004_R)
        with Locations((42.5, -57.5)):
            Circle(SKETCH004_R)
        with Locations((-42.5, -57.5)):
            Circle(SKETCH004_R)
        with Locations((-57.5, -42.5)):
            Circle(SKETCH004_R)
    extrude(amount=-HOLE_DEPTH, mode=Mode.SUBTRACT)

    # Sketch005 (on Face20 of Hole) → Pocket002 (cut)
    with BuildSketch(Plane(origin=(0, 0, -27), x_dir=(1, 0, 0), z_dir=(0, 0, -1))):
        with Locations((44.25, 23.811943)):
            Rectangle(SKETCH005_W, SKETCH005_H)
    extrude(amount=-POCKET002_DEPTH, mode=Mode.SUBTRACT)

    # Fillet001
    fillet001_edges = [part.edges().sort_by_distance(p)[0] for p in [
        (41.25, -26.811943, -15),
        (47.25, -26.811943, -15),
        (47.25, -20.811943, -15),
        (41.25, -20.811943, -15),
        (44.25, -26.811943, -3),
        (47.25, -23.811943, -3),
        (44.25, -20.811943, -3),
        (41.25, -23.811943, -3),
    ]]
    fillet(fillet001_edges, radius=FILLET001_R)

    # Fillet002
    fillet002_edges = [part.edges().sort_by_distance(p)[0] for p in [
        (-62.5, 0, 0),
    ]]
    fillet(fillet002_edges, radius=FILLET002_R)


solid = part.part
